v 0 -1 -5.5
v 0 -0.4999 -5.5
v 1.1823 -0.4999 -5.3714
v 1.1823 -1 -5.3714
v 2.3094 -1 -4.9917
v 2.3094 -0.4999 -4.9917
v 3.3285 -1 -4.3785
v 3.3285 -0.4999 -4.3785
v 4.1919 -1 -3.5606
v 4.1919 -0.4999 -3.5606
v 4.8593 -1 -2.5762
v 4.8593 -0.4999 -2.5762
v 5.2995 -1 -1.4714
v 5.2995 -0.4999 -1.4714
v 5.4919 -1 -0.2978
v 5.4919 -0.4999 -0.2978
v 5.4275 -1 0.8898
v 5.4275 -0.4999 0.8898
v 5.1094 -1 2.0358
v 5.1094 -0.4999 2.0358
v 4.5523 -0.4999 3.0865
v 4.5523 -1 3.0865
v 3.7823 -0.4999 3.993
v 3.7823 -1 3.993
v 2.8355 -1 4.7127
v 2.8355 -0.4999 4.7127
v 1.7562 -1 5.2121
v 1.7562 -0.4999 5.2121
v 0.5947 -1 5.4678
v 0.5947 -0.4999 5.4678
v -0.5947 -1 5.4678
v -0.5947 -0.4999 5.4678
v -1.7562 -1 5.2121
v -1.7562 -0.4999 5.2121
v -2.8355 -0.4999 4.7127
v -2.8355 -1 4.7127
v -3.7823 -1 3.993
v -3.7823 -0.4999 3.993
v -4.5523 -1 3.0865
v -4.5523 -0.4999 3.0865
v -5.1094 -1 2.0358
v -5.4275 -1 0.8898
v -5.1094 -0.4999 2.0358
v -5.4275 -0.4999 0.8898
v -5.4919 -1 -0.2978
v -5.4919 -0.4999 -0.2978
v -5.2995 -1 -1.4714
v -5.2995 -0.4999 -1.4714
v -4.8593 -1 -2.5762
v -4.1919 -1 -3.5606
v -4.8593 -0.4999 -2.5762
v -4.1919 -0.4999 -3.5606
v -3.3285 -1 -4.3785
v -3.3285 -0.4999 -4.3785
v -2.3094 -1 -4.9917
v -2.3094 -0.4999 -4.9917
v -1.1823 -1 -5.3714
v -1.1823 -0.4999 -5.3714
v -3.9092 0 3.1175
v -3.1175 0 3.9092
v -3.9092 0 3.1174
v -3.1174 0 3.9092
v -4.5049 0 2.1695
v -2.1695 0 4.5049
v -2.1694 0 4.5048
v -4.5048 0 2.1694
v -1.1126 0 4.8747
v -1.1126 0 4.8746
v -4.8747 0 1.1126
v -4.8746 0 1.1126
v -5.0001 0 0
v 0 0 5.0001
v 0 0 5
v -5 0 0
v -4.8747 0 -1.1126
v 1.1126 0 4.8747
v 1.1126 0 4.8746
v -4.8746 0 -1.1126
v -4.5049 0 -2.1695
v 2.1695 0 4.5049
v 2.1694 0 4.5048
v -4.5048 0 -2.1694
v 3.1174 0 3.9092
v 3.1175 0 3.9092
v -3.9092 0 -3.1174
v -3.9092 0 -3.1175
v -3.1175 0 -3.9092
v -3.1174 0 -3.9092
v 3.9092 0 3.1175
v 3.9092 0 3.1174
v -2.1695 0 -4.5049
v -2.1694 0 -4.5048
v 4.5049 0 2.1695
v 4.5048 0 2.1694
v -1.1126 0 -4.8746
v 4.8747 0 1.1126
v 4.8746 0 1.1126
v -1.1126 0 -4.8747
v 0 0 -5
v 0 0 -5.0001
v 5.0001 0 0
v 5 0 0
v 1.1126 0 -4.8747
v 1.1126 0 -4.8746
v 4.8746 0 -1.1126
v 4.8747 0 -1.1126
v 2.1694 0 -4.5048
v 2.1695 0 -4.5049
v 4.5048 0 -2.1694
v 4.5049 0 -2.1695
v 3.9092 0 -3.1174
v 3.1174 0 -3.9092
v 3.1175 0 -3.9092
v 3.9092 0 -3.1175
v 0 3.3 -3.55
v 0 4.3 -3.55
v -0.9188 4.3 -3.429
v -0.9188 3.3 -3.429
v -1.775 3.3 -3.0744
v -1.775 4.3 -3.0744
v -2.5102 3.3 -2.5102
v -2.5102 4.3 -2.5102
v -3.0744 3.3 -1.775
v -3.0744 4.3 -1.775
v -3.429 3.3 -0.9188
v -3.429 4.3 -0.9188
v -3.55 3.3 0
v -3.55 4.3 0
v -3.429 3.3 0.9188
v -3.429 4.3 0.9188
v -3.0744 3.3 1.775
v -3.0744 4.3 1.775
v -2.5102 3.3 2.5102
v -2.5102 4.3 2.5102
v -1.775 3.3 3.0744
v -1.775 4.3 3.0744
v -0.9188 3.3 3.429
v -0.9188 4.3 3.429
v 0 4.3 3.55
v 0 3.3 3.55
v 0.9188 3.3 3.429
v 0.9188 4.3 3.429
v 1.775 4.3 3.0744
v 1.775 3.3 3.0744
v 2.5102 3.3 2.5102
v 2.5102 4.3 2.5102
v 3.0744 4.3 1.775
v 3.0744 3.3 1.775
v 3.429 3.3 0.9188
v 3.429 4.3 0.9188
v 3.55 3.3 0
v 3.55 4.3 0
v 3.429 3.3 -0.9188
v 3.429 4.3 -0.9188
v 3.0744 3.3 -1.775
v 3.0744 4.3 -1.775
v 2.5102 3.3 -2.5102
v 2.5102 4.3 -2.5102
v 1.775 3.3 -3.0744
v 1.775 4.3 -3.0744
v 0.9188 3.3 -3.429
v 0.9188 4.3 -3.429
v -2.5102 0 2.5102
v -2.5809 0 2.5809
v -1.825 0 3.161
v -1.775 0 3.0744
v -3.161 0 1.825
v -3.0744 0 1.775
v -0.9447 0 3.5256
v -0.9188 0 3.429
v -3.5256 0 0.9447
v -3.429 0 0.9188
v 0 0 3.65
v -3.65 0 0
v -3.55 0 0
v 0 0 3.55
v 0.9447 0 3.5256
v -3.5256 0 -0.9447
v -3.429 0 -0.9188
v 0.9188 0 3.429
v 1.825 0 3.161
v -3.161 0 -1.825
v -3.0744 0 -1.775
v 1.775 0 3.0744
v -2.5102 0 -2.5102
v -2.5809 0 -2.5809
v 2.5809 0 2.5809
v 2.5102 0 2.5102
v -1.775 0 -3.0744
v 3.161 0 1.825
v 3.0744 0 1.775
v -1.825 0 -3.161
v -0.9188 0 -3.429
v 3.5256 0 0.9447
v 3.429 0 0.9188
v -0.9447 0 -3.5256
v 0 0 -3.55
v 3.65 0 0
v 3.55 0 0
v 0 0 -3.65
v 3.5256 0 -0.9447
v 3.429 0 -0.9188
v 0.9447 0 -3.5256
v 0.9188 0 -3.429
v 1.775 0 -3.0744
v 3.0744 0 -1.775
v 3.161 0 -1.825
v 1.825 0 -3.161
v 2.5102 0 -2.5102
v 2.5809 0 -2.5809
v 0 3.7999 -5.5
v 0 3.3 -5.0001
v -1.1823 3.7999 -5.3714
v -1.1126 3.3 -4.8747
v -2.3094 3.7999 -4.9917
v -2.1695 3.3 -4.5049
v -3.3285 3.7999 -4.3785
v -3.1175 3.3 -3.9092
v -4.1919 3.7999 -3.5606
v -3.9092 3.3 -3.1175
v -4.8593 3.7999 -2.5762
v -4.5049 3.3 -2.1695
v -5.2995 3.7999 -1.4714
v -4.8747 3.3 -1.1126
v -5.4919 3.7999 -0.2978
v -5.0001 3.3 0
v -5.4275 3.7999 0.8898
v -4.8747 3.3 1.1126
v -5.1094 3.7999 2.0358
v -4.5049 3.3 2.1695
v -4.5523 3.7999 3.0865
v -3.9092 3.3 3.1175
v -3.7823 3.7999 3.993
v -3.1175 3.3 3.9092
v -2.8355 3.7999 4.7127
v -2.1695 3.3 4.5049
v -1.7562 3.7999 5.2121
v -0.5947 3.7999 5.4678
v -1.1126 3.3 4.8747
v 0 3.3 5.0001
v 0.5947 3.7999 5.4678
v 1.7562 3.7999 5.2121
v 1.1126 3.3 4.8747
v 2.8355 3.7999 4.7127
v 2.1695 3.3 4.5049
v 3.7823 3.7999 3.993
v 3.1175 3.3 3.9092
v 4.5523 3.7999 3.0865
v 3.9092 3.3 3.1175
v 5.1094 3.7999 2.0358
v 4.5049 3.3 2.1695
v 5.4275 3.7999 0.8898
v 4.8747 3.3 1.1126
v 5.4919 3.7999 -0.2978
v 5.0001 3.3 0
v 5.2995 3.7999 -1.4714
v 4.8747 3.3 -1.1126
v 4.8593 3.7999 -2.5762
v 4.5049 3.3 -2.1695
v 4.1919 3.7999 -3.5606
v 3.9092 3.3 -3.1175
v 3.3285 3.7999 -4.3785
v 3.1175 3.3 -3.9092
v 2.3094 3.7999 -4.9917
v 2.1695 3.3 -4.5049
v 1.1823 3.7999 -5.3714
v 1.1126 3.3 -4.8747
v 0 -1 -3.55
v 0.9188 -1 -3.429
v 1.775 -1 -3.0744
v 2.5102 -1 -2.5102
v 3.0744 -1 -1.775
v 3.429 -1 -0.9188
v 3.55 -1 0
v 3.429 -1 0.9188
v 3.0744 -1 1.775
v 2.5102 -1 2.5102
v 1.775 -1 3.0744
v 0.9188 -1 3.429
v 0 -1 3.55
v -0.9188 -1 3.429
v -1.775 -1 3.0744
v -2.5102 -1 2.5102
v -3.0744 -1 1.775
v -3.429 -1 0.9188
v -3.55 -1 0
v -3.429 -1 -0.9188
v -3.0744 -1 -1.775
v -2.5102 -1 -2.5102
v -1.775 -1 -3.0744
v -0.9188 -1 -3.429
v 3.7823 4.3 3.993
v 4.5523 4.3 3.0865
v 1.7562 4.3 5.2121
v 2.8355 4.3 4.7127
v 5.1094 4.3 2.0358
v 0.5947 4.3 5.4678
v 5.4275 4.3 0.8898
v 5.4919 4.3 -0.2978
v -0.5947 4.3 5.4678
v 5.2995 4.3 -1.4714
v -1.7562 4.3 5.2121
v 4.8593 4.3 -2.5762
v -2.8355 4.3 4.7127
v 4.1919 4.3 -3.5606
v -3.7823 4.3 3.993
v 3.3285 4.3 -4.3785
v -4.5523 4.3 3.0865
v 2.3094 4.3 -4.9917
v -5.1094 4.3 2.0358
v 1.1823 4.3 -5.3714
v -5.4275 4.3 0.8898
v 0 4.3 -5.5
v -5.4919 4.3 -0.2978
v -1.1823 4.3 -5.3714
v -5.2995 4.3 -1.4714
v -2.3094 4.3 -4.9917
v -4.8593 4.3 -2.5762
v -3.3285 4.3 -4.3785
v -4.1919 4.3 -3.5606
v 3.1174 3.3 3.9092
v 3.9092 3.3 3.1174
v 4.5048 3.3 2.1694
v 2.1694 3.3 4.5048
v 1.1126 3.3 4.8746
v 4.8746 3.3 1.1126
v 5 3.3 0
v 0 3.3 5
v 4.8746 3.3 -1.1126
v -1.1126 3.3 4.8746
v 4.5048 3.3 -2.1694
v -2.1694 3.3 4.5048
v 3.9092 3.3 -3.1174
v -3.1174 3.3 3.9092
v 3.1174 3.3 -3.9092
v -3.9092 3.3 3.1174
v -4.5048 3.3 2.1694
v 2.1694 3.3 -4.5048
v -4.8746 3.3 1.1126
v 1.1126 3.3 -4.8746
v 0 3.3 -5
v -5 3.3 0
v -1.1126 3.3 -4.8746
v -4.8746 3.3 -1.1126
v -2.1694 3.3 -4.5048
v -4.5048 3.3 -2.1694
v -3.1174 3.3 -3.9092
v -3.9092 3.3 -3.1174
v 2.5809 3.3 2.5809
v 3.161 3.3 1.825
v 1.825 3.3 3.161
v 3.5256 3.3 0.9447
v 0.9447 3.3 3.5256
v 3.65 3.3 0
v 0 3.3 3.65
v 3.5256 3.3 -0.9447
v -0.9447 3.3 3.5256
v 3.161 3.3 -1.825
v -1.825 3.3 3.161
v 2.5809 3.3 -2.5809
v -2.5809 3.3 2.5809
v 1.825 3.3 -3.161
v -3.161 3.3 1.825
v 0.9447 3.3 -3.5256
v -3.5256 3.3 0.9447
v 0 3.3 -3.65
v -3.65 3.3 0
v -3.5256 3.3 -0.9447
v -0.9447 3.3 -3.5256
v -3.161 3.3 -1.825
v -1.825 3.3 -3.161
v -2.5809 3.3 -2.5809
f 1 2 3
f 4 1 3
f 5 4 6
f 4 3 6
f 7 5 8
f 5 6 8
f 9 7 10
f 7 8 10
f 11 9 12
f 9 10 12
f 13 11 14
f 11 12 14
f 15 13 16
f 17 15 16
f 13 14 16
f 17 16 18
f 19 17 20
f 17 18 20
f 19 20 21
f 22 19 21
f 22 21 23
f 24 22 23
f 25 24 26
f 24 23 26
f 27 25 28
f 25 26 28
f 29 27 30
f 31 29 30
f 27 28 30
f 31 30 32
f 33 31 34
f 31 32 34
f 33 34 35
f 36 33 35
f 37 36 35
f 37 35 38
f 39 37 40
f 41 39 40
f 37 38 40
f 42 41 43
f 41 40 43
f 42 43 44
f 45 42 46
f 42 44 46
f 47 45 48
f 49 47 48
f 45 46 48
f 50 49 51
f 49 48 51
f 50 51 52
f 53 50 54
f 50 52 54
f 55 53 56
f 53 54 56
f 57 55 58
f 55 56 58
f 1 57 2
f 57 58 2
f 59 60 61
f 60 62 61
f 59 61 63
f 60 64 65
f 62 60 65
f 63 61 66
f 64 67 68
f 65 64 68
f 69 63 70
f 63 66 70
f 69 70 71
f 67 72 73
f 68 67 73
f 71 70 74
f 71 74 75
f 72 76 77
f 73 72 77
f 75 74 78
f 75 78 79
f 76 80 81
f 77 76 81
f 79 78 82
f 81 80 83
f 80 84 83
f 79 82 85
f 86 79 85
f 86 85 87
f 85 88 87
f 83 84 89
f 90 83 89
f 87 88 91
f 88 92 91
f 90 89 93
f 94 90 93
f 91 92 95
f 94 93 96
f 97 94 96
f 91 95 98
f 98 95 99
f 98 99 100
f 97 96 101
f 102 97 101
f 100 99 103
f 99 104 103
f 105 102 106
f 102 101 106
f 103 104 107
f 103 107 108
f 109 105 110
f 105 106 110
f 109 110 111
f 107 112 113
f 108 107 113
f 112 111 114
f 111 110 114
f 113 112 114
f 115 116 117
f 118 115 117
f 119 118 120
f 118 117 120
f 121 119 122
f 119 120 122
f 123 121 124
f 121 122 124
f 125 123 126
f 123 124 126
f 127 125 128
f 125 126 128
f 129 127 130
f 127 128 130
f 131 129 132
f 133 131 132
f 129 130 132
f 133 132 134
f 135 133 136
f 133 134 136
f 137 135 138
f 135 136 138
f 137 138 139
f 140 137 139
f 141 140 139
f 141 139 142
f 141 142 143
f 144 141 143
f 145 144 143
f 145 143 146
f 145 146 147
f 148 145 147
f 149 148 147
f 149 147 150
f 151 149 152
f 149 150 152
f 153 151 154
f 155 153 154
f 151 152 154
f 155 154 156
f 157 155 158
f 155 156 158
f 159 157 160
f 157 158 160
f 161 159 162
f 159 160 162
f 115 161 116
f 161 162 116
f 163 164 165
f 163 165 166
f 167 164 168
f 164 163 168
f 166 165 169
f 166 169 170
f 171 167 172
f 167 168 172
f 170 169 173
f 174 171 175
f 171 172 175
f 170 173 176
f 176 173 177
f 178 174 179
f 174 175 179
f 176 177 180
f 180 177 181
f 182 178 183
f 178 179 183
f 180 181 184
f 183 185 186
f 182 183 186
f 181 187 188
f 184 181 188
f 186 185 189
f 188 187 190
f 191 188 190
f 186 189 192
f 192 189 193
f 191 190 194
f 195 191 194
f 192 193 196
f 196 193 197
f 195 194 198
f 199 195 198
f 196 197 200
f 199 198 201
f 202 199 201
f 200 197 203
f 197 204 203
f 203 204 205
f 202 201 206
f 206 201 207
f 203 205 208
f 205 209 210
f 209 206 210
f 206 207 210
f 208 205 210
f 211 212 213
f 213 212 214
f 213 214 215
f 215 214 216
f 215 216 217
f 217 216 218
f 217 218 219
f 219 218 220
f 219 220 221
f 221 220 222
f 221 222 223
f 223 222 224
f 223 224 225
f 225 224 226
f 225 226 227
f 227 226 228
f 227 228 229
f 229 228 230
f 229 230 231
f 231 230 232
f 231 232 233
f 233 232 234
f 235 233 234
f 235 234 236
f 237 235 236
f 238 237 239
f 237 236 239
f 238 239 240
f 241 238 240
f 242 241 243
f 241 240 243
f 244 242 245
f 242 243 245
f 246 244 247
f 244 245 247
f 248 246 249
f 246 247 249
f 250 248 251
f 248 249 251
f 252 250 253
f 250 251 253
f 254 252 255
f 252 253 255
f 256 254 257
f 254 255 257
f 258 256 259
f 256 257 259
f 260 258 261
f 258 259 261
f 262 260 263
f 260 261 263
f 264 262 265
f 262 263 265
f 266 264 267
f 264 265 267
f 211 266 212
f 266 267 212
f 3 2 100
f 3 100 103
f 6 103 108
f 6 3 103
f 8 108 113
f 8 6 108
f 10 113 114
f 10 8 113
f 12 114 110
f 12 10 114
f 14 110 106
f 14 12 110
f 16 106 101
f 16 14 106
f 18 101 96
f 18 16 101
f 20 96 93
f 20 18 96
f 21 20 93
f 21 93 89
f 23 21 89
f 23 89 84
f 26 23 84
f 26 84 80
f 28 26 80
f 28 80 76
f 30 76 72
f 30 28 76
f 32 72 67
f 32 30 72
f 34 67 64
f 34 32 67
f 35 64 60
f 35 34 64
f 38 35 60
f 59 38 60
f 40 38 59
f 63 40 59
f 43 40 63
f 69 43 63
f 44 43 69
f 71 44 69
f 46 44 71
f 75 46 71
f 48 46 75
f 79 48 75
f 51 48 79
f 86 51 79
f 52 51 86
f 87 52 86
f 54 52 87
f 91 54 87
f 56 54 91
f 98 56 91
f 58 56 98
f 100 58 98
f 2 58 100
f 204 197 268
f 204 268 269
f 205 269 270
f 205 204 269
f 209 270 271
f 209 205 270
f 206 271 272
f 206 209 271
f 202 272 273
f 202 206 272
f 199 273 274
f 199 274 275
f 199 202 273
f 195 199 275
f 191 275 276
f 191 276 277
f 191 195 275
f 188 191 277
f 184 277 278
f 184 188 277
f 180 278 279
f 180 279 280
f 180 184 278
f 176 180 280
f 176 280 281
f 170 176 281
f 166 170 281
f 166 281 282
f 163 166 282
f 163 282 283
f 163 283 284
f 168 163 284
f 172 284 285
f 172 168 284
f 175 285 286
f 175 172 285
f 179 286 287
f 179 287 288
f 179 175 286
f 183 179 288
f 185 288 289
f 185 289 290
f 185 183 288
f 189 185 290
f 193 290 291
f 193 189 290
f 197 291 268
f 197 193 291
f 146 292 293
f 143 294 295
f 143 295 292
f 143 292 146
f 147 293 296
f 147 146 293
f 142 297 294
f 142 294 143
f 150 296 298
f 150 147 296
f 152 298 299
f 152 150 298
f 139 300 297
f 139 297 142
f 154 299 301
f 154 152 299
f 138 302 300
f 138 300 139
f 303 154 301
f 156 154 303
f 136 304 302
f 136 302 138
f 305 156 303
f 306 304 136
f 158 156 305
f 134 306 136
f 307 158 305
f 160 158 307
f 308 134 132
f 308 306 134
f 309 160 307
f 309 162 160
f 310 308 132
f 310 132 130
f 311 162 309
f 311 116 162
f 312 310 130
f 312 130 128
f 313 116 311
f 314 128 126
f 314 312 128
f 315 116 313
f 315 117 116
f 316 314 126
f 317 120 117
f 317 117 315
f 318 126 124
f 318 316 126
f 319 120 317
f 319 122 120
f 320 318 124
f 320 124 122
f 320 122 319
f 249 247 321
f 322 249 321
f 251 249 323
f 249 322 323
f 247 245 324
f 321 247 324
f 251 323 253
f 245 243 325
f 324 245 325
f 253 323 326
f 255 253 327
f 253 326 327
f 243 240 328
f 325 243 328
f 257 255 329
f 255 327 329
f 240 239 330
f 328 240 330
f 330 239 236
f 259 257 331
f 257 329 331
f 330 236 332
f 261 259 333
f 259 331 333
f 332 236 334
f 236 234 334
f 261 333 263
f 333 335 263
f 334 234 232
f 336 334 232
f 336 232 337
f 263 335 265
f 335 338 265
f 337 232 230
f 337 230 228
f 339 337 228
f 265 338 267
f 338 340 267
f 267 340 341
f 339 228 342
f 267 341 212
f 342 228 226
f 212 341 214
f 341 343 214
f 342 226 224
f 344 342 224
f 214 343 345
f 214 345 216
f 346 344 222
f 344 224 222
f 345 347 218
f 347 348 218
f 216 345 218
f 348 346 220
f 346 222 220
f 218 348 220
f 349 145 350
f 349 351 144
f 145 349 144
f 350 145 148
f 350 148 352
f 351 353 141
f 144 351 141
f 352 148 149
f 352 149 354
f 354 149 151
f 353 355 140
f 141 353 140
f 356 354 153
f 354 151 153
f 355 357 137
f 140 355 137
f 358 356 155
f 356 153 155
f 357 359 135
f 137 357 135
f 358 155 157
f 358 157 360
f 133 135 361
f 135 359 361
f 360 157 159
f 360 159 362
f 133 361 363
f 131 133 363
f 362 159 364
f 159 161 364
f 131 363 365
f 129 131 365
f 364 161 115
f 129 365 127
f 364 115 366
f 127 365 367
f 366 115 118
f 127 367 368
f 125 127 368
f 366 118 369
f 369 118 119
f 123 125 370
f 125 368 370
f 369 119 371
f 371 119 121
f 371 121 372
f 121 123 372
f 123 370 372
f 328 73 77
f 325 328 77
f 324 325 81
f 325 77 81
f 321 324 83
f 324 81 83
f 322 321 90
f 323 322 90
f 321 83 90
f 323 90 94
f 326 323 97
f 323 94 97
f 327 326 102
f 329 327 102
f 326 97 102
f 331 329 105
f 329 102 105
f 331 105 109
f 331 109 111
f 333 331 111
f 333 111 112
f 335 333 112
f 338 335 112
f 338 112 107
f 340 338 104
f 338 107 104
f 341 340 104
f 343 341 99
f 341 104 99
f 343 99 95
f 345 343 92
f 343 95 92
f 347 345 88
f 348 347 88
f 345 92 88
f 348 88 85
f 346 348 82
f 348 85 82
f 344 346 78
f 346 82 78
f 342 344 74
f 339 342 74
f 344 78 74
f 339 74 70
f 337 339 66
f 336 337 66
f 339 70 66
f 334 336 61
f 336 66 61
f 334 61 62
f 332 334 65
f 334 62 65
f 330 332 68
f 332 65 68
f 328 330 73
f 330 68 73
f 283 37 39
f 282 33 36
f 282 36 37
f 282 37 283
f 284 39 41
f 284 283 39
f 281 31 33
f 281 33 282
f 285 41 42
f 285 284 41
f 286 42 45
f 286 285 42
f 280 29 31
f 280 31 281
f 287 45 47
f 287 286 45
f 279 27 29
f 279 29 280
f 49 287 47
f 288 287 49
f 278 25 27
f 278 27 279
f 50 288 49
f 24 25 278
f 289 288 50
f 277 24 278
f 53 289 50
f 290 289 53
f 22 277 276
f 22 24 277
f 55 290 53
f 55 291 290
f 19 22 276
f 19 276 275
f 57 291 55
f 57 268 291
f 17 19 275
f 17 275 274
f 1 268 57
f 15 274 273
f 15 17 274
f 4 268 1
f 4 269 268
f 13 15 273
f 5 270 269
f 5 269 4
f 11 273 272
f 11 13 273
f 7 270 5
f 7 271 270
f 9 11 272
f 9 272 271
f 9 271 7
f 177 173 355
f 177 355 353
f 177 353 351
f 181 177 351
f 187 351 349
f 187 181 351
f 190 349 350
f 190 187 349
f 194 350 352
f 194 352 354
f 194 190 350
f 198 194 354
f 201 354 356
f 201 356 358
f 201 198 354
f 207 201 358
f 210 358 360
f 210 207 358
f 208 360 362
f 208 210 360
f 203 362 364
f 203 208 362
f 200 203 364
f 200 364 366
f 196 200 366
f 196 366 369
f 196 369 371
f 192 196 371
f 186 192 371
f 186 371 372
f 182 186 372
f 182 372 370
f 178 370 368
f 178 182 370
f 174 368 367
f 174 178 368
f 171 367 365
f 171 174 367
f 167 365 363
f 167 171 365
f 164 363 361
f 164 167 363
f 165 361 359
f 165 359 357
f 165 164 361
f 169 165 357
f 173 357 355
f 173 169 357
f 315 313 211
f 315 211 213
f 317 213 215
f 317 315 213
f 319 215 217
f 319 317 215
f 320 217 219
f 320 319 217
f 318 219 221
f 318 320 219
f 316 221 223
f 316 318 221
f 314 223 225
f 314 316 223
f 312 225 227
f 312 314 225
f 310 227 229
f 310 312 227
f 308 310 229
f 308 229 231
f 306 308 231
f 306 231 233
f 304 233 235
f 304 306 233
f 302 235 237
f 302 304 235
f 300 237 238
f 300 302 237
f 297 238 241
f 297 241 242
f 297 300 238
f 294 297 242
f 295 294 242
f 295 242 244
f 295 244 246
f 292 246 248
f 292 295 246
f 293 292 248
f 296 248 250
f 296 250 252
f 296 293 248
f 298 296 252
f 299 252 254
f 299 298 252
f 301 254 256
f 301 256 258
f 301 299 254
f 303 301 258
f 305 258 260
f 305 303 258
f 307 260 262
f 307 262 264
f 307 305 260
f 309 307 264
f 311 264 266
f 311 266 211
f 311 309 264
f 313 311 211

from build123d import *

# Parameters (mm, degrees)
SKETCH_1_R      = 5
SKETCH_1_R_2    = 3.65
EXTRUDE_1_DEPTH = 3.3
SKETCH_2_R      = 5.5
SKETCH_2_R_2    = 3.55
EXTRUDE_2_DEPTH = 1
EXTRUDE_START   = 1
SKETCH_3_R      = 5.5
SKETCH_3_R_2    = 3.55
EXTRUDE_3_DEPTH = 1
CHAMFER_1_SIZE  = 0.5


with BuildPart() as part:
    # 草图1 → 凸台-拉伸1 (new body)
    with BuildSketch(Plane(origin=(0, 0, 0), x_dir=(1, 0, 0), z_dir=(0, 1, 0))):
        with Locations(Location((0, 0, 0), (0, 0, 270))):
            Circle(SKETCH_1_R)
        with Locations(Location((0, 0, 0), (0, 0, 270))):
            Circle(SKETCH_1_R_2, mode=Mode.SUBTRACT)
    extrude(amount=EXTRUDE_1_DEPTH)

    # 草图2 → 凸台-拉伸2 (add)
    with BuildSketch(Plane.XZ):
        with Locations(Location((0, 0, 0), (0, 0, 270))):
            Circle(SKETCH_2_R)
        with Locations(Location((0, 0, 0), (0, 0, 270))):
            Circle(SKETCH_2_R_2, mode=Mode.SUBTRACT)
    extrude(amount=EXTRUDE_2_DEPTH)

    # 草图3 → 凸台-拉伸3 (add)
    with BuildSketch(Plane(origin=(0, 3.3, 0), x_dir=(1, 0, 0), z_dir=(0, 1, 0)).offset(EXTRUDE_START)):
        with Locations(Location((0, 0, 0), (0, 0, 90))):
            Circle(SKETCH_3_R)
        with Locations(Location((0, 0, 0), (0, 0, 90))):
            Circle(SKETCH_3_R_2, mode=Mode.SUBTRACT)
    extrude(amount=-EXTRUDE_3_DEPTH)

    # 倒角1
    chamfer_1_edges = [part.edges().sort_by_distance(p)[0] for p in [
        (0, 0, 5.5),
        (0, 3.3, 5.5),
    ]]
    chamfer(chamfer_1_edges, length=CHAMFER_1_SIZE - 0.0001)  # a hair under: the kernel refuses the full size


solid = part.part
